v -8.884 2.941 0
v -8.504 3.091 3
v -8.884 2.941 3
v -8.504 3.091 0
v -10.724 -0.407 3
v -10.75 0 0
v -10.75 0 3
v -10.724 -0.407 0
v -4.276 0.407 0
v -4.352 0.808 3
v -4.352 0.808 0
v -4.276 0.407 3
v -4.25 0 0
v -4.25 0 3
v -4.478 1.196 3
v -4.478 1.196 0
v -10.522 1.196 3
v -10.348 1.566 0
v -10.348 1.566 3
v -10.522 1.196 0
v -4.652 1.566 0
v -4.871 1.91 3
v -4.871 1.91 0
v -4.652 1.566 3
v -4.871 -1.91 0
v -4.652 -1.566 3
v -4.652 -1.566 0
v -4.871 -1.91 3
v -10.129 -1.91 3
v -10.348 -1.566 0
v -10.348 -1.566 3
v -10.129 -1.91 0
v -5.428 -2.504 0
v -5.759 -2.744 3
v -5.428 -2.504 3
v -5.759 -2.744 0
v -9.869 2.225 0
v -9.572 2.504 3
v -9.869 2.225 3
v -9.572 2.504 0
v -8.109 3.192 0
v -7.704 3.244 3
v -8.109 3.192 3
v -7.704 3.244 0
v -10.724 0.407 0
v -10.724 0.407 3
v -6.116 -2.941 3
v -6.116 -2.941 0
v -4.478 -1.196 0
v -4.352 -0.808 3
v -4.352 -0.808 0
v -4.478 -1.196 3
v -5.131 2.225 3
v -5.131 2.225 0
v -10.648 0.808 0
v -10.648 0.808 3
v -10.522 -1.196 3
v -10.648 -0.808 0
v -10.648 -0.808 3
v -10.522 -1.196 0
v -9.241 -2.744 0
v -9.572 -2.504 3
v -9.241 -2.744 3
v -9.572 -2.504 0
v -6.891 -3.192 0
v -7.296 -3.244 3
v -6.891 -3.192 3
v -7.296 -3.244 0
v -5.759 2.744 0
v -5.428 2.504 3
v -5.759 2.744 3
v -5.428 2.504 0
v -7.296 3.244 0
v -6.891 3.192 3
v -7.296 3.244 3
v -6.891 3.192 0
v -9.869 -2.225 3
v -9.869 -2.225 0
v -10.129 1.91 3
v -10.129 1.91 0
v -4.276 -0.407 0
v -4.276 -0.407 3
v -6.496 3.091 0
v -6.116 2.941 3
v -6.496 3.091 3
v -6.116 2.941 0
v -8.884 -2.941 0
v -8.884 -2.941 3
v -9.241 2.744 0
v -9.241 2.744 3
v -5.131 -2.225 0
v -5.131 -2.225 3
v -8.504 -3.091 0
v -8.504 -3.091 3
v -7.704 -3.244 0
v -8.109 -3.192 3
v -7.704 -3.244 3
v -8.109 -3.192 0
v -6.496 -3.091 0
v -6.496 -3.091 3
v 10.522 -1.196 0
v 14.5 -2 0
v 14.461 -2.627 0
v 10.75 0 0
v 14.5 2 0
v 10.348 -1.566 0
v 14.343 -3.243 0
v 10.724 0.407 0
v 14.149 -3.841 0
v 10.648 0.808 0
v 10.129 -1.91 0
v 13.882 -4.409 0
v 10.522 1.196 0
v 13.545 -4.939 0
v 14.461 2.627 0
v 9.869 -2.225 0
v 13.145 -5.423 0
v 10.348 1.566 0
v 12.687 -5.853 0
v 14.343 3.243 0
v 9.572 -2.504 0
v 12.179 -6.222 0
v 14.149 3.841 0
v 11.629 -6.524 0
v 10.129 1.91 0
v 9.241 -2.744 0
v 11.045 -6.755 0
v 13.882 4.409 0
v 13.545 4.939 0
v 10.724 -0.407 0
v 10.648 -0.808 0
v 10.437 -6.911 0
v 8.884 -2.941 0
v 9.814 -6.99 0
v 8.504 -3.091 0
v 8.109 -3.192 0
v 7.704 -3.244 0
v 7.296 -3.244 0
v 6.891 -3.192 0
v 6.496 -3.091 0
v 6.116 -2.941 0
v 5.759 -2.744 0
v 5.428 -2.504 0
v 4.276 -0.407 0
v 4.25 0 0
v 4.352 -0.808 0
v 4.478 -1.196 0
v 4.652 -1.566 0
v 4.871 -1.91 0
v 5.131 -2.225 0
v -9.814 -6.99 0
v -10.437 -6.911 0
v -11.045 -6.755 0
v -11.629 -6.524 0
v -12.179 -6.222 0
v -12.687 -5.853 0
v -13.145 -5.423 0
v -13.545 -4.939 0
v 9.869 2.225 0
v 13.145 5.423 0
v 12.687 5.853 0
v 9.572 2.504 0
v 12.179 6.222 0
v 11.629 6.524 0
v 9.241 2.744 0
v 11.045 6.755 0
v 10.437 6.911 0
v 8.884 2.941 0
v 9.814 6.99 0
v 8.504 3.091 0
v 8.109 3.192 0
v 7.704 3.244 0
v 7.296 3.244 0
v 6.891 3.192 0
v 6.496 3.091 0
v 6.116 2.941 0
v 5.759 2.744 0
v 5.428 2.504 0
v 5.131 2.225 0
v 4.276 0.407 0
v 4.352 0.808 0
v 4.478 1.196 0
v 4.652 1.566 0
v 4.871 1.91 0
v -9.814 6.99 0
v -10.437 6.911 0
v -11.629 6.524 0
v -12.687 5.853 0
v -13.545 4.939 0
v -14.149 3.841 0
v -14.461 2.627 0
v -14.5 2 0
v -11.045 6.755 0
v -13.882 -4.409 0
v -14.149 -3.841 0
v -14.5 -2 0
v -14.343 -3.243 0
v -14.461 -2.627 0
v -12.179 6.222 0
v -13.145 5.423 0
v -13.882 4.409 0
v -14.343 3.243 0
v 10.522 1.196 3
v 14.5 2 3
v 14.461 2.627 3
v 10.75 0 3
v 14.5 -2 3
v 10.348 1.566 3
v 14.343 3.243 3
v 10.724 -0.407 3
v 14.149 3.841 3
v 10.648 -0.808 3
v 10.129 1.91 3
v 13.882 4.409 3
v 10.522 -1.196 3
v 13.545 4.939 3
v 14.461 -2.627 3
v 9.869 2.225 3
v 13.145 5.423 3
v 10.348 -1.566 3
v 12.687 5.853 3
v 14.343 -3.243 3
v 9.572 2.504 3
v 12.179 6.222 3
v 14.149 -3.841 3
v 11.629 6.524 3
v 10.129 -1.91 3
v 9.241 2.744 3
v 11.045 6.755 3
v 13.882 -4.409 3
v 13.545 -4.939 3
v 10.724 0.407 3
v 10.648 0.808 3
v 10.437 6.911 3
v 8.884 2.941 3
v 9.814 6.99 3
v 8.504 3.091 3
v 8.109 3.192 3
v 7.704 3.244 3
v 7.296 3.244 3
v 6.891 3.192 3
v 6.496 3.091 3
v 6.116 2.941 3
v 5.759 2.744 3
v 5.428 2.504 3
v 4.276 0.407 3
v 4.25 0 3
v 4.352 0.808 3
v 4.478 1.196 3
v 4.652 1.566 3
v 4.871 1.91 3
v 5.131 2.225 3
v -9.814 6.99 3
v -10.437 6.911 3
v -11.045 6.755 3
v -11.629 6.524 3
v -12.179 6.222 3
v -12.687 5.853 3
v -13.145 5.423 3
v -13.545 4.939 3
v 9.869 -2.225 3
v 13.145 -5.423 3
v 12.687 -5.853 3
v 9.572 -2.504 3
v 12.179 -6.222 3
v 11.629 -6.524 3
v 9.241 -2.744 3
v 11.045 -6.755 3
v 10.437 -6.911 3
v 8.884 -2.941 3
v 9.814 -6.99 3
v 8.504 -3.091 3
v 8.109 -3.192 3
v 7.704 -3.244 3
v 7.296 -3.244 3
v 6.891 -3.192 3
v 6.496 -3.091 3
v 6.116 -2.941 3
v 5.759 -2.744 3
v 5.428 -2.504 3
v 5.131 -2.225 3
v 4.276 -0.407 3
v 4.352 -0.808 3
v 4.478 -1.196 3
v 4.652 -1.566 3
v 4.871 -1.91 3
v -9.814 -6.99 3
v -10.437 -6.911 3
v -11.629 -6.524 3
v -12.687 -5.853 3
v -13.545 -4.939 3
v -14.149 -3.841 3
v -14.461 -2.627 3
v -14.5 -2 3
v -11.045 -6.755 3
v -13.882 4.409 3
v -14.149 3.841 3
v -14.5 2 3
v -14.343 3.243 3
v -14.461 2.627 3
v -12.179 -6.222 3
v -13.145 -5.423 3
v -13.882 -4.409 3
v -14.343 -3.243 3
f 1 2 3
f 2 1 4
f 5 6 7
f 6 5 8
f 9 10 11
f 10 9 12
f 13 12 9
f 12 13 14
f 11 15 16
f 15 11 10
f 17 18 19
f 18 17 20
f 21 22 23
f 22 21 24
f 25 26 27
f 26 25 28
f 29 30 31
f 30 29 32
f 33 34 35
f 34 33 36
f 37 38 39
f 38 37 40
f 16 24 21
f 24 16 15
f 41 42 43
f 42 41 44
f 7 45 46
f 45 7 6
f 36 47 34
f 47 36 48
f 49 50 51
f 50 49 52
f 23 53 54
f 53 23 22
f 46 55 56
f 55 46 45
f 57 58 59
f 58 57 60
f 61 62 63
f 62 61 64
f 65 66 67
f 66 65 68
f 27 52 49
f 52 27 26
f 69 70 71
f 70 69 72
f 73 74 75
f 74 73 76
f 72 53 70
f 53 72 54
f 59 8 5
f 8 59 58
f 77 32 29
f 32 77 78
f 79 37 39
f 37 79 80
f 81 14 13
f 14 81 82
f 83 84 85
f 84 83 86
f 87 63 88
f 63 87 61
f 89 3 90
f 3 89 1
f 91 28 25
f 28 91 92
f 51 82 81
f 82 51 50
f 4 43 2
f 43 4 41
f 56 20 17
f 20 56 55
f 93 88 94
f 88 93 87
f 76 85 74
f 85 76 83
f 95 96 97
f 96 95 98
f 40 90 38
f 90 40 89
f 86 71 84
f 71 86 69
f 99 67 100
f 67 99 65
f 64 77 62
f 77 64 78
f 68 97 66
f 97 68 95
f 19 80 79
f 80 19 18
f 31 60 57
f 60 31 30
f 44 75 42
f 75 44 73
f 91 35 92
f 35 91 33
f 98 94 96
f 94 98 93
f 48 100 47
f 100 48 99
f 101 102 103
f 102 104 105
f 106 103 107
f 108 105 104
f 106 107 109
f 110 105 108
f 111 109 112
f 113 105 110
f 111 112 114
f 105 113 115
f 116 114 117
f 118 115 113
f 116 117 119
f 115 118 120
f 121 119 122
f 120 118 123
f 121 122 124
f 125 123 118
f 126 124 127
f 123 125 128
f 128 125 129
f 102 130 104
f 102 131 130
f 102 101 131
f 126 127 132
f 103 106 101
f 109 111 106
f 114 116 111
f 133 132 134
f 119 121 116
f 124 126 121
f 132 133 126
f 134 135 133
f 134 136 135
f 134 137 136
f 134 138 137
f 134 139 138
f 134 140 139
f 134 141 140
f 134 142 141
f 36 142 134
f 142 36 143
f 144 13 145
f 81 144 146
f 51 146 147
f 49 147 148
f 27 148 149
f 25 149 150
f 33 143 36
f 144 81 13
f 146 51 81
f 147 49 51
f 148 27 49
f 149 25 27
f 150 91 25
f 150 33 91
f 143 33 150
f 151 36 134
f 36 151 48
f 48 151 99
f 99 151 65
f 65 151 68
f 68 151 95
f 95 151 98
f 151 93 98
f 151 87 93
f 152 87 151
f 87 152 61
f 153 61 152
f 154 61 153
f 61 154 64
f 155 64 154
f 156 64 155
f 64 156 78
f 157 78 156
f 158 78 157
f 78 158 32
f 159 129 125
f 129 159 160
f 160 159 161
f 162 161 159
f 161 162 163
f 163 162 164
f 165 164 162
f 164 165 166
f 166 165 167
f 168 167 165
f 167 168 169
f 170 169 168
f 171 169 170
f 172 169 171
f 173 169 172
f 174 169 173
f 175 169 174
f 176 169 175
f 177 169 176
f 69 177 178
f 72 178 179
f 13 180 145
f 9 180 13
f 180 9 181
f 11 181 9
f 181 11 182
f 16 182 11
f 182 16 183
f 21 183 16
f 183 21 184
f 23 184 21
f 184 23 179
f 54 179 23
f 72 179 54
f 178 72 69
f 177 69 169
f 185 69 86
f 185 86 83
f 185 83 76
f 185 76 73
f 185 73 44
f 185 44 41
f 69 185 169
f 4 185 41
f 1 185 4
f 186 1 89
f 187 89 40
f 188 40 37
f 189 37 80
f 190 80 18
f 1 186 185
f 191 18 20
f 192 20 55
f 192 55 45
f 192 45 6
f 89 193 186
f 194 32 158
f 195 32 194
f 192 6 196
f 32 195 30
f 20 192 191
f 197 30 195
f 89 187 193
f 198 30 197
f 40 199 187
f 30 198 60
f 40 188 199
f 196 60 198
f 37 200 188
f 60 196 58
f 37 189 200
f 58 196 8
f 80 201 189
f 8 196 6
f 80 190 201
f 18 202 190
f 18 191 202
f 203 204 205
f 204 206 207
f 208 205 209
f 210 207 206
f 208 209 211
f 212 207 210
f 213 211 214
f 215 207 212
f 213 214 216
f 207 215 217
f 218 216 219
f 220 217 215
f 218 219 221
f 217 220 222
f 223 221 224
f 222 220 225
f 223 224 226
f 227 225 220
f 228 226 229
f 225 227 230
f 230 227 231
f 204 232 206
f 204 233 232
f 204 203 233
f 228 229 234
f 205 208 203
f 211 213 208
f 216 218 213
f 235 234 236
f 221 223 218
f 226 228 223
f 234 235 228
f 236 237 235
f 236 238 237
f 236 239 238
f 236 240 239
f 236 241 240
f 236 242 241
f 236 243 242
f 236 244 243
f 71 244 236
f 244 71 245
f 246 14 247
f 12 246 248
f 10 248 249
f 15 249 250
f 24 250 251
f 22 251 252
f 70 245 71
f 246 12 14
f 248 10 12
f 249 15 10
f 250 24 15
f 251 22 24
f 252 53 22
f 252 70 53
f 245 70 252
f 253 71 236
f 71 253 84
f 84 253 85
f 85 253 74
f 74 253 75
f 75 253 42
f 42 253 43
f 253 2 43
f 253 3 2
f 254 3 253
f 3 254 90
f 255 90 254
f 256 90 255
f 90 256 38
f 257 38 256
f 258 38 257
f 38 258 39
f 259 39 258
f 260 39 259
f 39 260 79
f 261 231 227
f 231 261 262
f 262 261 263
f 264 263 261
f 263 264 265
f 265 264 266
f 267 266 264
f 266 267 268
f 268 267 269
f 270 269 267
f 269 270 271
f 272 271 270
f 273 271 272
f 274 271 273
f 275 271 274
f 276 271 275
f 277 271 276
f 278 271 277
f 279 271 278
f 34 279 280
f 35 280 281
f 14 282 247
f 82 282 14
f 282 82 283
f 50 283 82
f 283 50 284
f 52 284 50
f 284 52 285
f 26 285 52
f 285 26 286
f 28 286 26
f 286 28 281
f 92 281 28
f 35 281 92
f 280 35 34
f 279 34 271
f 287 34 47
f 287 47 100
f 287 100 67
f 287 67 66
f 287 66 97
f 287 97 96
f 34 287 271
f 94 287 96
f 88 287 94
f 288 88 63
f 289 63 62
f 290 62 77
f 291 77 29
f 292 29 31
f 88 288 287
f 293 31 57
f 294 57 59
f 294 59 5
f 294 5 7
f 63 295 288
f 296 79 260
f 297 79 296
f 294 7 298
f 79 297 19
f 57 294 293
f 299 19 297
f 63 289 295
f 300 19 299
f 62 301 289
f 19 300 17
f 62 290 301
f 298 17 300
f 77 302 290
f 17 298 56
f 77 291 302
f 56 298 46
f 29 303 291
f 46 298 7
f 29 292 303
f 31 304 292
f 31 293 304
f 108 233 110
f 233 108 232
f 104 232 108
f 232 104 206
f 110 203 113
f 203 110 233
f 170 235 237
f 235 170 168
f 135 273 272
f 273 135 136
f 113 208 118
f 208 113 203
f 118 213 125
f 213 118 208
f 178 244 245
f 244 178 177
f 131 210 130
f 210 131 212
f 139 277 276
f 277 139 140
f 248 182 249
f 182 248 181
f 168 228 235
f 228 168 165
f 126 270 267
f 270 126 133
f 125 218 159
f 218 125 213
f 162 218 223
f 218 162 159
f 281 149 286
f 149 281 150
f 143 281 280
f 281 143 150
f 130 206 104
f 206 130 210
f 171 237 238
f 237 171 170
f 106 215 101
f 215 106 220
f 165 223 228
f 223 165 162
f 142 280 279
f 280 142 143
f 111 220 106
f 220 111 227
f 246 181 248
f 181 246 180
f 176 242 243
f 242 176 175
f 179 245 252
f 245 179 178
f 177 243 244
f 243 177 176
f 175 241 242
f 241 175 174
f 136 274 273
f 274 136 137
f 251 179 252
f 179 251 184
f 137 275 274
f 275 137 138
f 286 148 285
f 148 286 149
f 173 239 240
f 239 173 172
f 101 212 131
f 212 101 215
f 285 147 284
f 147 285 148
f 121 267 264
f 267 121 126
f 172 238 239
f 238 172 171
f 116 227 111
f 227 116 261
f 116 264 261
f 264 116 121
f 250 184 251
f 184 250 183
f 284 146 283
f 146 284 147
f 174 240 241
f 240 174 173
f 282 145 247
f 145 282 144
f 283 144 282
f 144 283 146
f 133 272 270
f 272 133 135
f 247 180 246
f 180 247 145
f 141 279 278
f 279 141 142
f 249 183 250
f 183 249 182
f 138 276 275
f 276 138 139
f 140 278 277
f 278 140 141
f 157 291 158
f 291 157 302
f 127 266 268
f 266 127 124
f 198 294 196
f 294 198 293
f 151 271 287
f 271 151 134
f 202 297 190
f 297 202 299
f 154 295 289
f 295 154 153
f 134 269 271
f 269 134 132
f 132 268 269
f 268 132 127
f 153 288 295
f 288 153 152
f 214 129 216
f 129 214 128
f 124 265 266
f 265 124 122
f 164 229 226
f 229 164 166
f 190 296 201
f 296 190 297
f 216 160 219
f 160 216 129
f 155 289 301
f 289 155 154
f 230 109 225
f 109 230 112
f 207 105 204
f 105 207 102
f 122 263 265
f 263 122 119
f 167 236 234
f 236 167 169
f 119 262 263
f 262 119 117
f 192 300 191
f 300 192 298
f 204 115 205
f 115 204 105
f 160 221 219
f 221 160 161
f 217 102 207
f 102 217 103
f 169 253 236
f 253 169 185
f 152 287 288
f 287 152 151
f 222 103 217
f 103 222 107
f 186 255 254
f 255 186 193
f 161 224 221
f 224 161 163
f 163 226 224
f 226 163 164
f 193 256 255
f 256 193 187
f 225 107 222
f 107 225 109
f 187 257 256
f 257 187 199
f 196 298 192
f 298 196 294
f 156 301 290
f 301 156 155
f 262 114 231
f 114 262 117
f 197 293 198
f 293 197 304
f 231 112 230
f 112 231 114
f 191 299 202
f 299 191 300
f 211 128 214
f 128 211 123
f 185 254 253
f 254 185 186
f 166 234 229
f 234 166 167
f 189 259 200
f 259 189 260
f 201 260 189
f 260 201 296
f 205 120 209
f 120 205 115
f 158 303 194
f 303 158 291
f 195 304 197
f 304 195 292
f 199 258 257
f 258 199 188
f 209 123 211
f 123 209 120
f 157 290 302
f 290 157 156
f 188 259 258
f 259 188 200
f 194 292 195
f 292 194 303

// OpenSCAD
$fn = 50;


difference() {
	union() {
		hull() {
			translate(v = [-9.5000000000, 2.0000000000, 0]) {
				cylinder(h = 3, r = 5);
			}
			translate(v = [9.5000000000, 2.0000000000, 0]) {
				cylinder(h = 3, r = 5);
			}
			translate(v = [-9.5000000000, -2.0000000000, 0]) {
				cylinder(h = 3, r = 5);
			}
			translate(v = [9.5000000000, -2.0000000000, 0]) {
				cylinder(h = 3, r = 5);
			}
		}
	}
	union() {
		translate(v = [-7.5000000000, 0.0000000000, 0]) {
			cylinder(h = 3, r = 3.2500000000);
		}
		translate(v = [7.5000000000, 0.0000000000, 0]) {
			cylinder(h = 3, r = 3.2500000000);
		}
		translate(v = [-7.5000000000, 0.0000000000, 0]) {
			cylinder(h = 3, r = 1.8000000000);
		}
		translate(v = [7.5000000000, 0.0000000000, 0]) {
			cylinder(h = 3, r = 1.8000000000);
		}
		translate(v = [-7.5000000000, 0.0000000000, 0]) {
			cylinder(h = 3, r = 1.8000000000);
		}
		translate(v = [7.5000000000, 0.0000000000, 0]) {
			cylinder(h = 3, r = 1.8000000000);
		}
		translate(v = [-7.5000000000, 0.0000000000, 0]) {
			cylinder(h = 3, r = 1.8000000000);
		}
		translate(v = [7.5000000000, 0.0000000000, 0]) {
			cylinder(h = 3, r = 1.8000000000);
		}
	}
}
